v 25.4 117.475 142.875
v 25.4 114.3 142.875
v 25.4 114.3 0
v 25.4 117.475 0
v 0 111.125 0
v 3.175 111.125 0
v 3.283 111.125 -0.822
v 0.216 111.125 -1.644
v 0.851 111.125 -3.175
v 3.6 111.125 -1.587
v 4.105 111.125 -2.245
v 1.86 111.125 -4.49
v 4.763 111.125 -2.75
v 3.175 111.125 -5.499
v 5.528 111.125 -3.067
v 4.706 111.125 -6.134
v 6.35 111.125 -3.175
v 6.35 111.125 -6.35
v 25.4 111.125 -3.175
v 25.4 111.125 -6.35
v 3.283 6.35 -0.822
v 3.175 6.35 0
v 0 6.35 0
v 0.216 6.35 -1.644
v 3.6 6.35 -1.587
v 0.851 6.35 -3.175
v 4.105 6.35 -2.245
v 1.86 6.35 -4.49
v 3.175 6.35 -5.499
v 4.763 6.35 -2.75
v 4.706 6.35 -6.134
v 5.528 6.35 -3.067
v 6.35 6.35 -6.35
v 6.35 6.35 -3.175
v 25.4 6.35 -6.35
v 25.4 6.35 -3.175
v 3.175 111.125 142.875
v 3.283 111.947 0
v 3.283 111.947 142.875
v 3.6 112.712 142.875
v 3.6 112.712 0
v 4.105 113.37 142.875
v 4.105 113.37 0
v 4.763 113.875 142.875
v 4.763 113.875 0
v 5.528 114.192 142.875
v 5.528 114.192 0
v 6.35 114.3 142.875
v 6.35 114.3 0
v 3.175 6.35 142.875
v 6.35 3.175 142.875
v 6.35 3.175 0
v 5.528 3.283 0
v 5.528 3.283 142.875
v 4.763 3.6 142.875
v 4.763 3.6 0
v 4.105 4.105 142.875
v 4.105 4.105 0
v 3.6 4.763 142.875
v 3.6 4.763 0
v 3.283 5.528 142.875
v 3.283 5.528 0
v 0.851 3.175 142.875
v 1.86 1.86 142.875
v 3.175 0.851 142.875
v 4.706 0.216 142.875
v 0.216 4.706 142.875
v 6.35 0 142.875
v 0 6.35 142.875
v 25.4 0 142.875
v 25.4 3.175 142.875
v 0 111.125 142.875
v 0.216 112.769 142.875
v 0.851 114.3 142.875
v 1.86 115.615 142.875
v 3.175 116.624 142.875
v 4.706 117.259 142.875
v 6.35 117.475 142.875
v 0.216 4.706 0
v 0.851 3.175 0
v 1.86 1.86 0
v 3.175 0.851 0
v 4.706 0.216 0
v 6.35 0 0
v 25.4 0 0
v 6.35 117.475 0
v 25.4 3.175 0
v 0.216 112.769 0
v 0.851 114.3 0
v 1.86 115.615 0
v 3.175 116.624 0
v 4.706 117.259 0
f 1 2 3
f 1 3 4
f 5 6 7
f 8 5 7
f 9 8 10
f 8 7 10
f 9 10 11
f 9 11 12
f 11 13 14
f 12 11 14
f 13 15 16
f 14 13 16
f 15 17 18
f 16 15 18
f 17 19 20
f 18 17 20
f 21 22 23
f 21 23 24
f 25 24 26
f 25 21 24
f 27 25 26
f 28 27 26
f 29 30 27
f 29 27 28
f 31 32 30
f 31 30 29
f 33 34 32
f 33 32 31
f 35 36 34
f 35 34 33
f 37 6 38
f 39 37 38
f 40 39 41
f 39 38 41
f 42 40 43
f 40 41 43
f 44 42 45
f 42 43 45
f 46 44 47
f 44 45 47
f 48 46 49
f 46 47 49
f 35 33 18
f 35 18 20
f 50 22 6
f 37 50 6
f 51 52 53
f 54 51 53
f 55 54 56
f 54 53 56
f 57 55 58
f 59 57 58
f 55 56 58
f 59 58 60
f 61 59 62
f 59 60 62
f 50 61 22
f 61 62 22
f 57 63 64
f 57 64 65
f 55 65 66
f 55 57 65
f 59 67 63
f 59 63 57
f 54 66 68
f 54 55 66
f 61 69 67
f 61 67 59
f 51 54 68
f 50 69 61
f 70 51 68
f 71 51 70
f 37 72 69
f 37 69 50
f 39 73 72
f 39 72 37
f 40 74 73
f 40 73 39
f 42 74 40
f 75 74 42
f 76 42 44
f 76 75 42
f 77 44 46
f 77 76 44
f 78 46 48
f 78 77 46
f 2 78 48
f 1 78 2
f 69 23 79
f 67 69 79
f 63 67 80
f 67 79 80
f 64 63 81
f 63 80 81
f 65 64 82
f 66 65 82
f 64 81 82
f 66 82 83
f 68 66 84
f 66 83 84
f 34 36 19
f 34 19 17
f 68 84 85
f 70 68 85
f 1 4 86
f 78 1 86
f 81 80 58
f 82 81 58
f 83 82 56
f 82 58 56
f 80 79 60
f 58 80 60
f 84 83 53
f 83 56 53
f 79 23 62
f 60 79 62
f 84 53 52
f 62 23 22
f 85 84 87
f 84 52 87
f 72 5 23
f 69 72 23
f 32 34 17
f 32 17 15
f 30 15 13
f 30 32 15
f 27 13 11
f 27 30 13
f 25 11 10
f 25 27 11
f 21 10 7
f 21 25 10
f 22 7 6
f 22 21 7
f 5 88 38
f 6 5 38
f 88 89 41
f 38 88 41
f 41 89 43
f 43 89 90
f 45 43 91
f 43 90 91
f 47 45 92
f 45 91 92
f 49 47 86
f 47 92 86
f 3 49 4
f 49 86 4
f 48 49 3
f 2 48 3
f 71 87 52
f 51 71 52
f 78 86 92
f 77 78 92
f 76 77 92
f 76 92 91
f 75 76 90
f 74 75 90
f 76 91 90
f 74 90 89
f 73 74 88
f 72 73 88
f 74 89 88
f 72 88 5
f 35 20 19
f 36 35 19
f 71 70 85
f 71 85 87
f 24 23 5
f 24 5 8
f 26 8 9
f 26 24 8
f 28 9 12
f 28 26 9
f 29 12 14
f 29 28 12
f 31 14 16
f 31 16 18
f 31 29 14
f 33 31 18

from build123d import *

# Parameters (mm, degrees)
BASE_FLANGE1_DEPTH = 142.875
EDGE_FLANGE1_DEPTH = 104.775


# Sheet-metal steps are written as plain solids
with BuildPart() as part:
    # Sketch1 → Base-Flange1 (new body)
    with BuildSketch(Plane.XY):
        with BuildLine():
            Line((25.4, 117.475), (6.35, 117.475))
            ThreePointArc((6.35, 117.475), (1.859871939, 115.615128061), (0, 111.125))
            Line((0, 111.125), (0, 6.35))
            ThreePointArc((0, 6.35), (1.859871939, 1.859871939), (6.35, 0))
            Line((6.35, 0), (25.4, 0))
            Line((25.4, 0), (25.4, 3.175))
            Line((25.4, 3.175), (6.35, 3.175))
            ThreePointArc((6.35, 3.175), (4.10493597, 4.10493597), (3.175, 6.35))
            Line((3.175, 6.35), (3.175, 111.125))
            ThreePointArc((3.175, 111.125), (4.10493597, 113.37006403), (6.35, 114.3))
            Line((6.35, 114.3), (25.4, 114.3))
            Line((25.4, 114.3), (25.4, 117.475))
        make_face()
    extrude(amount=BASE_FLANGE1_DEPTH)

    # Edge-Flange1 section (across the edge) → Edge-Flange1 (add)
    with BuildSketch(Plane(origin=(3.175, 6.35, -3.175), x_dir=(0, 0, 1), z_dir=(0, 1, 0))):
        with BuildLine():
            Line((-3.175, 3.175), (-3.175, 22.225))
            Line((-3.175, 22.225), (0, 22.225))
            Line((0, 22.225), (0, 3.175))
            ThreePointArc((0, 3.175), (0.92993597, 0.92993597), (3.175, 0))
            Line((3.175, 0), (3.175, -3.175))
            ThreePointArc((3.175, -3.175), (-1.315128061, -1.315128061), (-3.175, 3.175))
        make_face()
    extrude(amount=EDGE_FLANGE1_DEPTH)


solid = part.part
